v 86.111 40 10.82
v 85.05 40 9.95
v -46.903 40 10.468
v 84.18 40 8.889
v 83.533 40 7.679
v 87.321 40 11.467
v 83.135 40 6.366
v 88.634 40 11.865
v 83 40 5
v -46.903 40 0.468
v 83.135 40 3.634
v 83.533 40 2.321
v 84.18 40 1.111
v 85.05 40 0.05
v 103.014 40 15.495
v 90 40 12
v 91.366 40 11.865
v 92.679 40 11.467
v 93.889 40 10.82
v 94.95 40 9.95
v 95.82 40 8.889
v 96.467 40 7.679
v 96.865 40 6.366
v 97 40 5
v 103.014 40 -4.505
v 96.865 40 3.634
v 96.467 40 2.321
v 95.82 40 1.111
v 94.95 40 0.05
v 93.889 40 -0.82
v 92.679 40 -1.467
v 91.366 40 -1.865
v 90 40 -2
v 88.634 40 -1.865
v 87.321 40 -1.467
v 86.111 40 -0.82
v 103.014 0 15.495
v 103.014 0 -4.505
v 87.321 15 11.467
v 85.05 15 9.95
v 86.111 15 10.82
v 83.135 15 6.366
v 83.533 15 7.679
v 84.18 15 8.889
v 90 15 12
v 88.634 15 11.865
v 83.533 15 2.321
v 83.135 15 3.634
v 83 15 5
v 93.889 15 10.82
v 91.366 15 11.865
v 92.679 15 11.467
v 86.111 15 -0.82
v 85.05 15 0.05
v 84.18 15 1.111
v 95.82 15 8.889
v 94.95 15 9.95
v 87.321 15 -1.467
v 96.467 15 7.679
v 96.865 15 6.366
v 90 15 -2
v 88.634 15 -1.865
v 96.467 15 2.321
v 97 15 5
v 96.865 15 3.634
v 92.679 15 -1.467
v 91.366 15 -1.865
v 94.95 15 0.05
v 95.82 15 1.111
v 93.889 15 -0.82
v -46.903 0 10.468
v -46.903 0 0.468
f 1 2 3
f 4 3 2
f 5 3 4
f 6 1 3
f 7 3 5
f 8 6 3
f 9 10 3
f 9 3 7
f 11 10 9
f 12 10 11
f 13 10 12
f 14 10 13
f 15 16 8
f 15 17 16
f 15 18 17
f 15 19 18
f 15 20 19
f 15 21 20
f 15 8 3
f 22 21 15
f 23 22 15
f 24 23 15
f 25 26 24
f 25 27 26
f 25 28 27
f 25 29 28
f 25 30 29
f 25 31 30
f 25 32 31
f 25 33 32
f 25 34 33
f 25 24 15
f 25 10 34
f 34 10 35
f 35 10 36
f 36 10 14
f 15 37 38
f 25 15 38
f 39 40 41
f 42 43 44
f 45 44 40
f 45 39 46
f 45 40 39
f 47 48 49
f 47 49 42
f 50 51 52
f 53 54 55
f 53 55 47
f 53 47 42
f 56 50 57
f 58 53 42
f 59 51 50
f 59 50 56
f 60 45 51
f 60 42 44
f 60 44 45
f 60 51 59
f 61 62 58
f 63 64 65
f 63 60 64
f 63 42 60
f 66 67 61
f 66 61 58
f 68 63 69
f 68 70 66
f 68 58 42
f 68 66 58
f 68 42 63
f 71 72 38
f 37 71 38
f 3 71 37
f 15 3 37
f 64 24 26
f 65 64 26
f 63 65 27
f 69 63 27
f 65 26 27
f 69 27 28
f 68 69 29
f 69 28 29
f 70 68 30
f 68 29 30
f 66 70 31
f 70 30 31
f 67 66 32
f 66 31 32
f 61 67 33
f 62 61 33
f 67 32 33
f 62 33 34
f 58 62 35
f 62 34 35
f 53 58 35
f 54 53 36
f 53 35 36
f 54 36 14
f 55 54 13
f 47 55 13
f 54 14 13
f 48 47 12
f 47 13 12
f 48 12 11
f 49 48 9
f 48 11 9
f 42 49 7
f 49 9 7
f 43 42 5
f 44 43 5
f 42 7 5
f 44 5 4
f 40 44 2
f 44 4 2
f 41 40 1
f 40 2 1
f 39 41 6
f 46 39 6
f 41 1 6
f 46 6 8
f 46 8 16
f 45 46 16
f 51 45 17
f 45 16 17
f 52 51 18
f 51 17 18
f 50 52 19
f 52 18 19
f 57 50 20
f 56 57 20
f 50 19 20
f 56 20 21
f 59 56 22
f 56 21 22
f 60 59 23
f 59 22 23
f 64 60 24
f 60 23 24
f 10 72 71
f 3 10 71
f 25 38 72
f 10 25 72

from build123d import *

# Parameters (mm, degrees)
BOSS_EXTRUDE1_DEPTH = 40
SKETCH2_R           = 7
CUT_EXTRUDE1_DEPTH  = 25


with BuildPart() as part:
    # Sketch1 → Boss-Extrude1 (new body)
    with BuildSketch(Plane(origin=(0, 0, 0), x_dir=(1, 0, 0), z_dir=(0, 1, 0))):
        Polygon((-46.903241084, -0.468259604), (-46.903241084, -10.468259604), (103.014291308, -15.494982846), (103.014291308, 4.505017154), align=None)
    extrude(amount=BOSS_EXTRUDE1_DEPTH)

    # Sketch2 → Cut-Extrude1 (cut)
    with BuildSketch(Plane(origin=(0, 40, 0), x_dir=(1, 0, 0), z_dir=(0, 1, 0))):
        with Locations((90, -5)):
            Circle(SKETCH2_R)
    extrude(amount=-CUT_EXTRUDE1_DEPTH, mode=Mode.SUBTRACT)


solid = part.part
